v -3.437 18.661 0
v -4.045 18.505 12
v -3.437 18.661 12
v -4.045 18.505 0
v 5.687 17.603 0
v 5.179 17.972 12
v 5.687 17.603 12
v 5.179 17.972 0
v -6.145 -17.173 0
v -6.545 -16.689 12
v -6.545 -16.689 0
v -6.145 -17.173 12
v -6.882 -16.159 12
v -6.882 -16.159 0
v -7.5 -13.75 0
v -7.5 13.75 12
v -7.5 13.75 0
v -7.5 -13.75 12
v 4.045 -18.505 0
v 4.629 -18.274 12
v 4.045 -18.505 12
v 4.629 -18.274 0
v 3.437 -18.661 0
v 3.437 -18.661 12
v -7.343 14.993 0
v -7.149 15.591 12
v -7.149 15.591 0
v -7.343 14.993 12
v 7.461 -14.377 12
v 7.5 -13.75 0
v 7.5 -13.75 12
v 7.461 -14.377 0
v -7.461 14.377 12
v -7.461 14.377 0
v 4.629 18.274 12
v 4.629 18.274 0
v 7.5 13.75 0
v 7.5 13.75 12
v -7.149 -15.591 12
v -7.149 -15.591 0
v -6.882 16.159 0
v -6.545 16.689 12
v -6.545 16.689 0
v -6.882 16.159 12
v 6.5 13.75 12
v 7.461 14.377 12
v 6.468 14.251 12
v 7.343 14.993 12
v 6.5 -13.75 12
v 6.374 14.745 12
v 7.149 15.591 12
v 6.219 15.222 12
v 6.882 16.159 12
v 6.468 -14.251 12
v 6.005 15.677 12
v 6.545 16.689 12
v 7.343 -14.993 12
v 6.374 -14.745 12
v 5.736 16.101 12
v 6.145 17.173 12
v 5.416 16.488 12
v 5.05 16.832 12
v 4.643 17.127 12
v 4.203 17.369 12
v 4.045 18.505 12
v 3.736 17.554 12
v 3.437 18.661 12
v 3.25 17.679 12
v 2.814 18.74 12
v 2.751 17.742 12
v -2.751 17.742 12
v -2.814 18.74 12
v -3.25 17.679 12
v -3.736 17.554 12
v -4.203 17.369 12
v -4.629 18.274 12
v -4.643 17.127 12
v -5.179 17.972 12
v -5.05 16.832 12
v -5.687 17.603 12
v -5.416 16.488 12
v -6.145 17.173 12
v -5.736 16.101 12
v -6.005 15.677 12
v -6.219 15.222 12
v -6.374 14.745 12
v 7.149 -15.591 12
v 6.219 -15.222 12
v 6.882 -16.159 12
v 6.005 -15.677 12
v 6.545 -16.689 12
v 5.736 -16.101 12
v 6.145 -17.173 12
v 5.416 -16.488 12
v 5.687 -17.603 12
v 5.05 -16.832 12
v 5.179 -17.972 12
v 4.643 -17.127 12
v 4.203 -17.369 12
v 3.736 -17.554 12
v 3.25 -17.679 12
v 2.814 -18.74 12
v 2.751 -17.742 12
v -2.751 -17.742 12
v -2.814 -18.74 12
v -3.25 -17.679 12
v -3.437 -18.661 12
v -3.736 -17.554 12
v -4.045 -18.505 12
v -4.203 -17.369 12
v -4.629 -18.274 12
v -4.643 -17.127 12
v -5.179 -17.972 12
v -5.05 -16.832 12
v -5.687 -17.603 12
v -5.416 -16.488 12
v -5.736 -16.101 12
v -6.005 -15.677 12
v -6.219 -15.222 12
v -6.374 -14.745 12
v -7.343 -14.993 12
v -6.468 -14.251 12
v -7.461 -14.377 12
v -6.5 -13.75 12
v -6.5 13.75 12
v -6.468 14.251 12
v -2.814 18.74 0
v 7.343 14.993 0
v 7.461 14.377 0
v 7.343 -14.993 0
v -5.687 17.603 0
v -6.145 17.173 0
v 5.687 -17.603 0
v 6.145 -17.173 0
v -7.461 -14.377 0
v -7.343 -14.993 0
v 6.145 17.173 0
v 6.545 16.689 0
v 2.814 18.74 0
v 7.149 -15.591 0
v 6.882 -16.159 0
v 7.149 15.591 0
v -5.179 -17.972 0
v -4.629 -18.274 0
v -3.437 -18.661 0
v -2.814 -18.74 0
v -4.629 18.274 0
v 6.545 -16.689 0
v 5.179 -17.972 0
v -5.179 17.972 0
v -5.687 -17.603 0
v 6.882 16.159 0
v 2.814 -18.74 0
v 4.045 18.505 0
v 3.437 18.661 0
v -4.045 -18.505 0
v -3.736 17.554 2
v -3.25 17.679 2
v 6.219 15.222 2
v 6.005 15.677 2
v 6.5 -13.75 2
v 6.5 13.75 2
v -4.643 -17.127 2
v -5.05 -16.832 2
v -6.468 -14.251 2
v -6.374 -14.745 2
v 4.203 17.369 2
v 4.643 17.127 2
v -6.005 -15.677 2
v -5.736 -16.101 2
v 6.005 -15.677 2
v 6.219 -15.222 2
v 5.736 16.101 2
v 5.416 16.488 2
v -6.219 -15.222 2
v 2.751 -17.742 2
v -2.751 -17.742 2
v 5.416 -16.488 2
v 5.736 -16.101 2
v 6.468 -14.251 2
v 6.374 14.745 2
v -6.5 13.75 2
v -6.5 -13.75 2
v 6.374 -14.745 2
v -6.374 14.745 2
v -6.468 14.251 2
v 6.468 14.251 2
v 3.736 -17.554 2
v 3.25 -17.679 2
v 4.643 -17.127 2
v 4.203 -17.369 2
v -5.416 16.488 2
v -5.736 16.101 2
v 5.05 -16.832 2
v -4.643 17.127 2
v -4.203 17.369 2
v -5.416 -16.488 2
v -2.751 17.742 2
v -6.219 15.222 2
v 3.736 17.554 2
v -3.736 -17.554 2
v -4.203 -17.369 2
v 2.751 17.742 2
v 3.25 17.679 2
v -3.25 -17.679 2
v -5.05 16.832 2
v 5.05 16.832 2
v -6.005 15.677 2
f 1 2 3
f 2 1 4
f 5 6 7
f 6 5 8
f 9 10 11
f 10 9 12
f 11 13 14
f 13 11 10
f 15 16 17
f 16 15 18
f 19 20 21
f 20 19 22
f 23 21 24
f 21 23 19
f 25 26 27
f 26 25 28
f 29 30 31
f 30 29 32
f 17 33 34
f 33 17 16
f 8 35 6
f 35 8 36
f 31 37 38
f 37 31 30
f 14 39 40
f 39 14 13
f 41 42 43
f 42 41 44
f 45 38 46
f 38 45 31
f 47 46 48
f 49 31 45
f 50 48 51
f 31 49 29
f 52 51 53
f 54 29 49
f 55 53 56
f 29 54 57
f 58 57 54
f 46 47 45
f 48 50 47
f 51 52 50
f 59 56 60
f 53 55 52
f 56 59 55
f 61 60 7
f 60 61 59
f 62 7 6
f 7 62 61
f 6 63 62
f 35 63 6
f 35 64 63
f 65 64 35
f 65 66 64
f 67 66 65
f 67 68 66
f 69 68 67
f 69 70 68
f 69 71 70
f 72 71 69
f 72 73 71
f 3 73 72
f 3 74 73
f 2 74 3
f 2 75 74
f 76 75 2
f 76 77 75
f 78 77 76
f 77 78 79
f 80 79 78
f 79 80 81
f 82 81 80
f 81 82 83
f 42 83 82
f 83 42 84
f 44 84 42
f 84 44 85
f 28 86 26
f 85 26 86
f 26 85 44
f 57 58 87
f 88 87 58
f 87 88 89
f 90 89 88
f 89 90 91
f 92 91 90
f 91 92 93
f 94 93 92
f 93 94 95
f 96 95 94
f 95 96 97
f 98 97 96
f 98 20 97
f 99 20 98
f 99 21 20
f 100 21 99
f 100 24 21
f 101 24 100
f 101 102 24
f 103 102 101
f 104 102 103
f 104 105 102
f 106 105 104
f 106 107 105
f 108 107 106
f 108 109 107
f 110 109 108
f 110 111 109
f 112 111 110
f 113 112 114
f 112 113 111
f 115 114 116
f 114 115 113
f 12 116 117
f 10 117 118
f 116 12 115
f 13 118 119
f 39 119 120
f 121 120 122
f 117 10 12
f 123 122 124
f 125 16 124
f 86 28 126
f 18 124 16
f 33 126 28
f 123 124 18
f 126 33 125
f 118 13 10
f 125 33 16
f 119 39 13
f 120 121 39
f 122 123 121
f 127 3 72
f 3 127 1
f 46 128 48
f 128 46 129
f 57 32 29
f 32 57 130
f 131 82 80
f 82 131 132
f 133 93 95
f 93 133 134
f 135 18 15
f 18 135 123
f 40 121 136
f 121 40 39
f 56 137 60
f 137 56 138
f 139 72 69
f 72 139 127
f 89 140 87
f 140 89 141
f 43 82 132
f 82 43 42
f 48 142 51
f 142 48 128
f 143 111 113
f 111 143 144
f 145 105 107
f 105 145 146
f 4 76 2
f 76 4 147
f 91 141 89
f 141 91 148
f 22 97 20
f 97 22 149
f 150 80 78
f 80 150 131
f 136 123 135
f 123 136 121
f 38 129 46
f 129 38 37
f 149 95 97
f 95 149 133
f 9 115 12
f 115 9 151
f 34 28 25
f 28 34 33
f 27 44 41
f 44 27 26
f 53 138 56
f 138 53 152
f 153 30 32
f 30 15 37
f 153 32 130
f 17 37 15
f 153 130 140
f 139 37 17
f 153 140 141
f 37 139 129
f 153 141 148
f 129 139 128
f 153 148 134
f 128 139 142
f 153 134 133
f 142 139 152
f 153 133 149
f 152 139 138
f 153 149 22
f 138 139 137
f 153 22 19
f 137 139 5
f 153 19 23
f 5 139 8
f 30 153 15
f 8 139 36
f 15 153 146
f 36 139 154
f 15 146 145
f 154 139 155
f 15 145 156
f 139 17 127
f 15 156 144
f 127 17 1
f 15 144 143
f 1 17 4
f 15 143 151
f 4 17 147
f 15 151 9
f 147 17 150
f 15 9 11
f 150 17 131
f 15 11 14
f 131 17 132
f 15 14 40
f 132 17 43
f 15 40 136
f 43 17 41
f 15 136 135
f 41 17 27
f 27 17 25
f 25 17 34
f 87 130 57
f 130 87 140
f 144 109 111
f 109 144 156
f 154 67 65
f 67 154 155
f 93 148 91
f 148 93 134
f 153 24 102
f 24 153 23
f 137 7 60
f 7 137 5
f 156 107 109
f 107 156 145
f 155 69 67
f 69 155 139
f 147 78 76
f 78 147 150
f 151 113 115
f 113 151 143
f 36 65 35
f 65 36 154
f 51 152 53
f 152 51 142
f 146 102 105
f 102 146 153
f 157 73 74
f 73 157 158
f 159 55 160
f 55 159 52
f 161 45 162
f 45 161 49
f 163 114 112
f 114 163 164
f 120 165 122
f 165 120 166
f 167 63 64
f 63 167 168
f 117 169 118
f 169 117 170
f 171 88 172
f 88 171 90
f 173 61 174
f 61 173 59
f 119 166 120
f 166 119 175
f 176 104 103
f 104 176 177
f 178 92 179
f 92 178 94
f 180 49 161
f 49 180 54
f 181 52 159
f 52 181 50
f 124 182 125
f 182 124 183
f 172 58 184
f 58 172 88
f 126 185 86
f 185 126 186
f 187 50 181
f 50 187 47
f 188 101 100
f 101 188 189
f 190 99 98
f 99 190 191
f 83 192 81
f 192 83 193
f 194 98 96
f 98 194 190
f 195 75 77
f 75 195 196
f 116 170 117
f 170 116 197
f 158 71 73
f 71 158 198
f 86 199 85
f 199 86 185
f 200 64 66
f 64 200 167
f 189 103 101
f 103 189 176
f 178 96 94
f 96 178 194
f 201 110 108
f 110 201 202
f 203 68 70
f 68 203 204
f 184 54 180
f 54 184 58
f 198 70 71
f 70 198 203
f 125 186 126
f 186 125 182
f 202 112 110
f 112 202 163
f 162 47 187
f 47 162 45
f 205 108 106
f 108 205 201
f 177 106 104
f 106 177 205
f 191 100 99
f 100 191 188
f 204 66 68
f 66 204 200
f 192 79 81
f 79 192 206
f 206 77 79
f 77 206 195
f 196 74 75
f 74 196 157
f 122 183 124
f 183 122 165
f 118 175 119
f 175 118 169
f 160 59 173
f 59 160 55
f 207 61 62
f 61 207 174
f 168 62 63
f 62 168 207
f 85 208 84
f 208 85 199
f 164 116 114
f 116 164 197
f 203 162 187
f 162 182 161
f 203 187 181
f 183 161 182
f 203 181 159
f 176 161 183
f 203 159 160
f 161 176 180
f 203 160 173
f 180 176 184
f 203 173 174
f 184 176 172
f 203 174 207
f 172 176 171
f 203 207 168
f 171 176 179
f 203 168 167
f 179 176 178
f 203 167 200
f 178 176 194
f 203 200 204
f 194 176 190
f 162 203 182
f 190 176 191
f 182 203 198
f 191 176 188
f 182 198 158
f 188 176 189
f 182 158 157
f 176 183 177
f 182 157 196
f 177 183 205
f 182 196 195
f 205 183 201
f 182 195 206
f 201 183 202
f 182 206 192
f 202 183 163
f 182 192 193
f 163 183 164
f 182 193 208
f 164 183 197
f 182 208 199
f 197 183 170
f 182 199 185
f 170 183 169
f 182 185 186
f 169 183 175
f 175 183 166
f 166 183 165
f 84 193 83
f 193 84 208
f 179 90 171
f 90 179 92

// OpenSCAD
$fn = 50;


difference() {
	union() {
		hull() {
			translate(v = [-2.5000000000, 13.7500000000, 0]) {
				cylinder(h = 12, r = 5);
			}
			translate(v = [2.5000000000, 13.7500000000, 0]) {
				cylinder(h = 12, r = 5);
			}
			translate(v = [-2.5000000000, -13.7500000000, 0]) {
				cylinder(h = 12, r = 5);
			}
			translate(v = [2.5000000000, -13.7500000000, 0]) {
				cylinder(h = 12, r = 5);
			}
		}
	}
	union() {
		translate(v = [0, 0, 2]) {
			hull() {
				translate(v = [-2.5000000000, 13.7500000000, 0]) {
					cylinder(h = 10, r = 4);
				}
				translate(v = [2.5000000000, 13.7500000000, 0]) {
					cylinder(h = 10, r = 4);
				}
				translate(v = [-2.5000000000, -13.7500000000, 0]) {
					cylinder(h = 10, r = 4);
				}
				translate(v = [2.5000000000, -13.7500000000, 0]) {
					cylinder(h = 10, r = 4);
				}
			}
		}
	}
}
